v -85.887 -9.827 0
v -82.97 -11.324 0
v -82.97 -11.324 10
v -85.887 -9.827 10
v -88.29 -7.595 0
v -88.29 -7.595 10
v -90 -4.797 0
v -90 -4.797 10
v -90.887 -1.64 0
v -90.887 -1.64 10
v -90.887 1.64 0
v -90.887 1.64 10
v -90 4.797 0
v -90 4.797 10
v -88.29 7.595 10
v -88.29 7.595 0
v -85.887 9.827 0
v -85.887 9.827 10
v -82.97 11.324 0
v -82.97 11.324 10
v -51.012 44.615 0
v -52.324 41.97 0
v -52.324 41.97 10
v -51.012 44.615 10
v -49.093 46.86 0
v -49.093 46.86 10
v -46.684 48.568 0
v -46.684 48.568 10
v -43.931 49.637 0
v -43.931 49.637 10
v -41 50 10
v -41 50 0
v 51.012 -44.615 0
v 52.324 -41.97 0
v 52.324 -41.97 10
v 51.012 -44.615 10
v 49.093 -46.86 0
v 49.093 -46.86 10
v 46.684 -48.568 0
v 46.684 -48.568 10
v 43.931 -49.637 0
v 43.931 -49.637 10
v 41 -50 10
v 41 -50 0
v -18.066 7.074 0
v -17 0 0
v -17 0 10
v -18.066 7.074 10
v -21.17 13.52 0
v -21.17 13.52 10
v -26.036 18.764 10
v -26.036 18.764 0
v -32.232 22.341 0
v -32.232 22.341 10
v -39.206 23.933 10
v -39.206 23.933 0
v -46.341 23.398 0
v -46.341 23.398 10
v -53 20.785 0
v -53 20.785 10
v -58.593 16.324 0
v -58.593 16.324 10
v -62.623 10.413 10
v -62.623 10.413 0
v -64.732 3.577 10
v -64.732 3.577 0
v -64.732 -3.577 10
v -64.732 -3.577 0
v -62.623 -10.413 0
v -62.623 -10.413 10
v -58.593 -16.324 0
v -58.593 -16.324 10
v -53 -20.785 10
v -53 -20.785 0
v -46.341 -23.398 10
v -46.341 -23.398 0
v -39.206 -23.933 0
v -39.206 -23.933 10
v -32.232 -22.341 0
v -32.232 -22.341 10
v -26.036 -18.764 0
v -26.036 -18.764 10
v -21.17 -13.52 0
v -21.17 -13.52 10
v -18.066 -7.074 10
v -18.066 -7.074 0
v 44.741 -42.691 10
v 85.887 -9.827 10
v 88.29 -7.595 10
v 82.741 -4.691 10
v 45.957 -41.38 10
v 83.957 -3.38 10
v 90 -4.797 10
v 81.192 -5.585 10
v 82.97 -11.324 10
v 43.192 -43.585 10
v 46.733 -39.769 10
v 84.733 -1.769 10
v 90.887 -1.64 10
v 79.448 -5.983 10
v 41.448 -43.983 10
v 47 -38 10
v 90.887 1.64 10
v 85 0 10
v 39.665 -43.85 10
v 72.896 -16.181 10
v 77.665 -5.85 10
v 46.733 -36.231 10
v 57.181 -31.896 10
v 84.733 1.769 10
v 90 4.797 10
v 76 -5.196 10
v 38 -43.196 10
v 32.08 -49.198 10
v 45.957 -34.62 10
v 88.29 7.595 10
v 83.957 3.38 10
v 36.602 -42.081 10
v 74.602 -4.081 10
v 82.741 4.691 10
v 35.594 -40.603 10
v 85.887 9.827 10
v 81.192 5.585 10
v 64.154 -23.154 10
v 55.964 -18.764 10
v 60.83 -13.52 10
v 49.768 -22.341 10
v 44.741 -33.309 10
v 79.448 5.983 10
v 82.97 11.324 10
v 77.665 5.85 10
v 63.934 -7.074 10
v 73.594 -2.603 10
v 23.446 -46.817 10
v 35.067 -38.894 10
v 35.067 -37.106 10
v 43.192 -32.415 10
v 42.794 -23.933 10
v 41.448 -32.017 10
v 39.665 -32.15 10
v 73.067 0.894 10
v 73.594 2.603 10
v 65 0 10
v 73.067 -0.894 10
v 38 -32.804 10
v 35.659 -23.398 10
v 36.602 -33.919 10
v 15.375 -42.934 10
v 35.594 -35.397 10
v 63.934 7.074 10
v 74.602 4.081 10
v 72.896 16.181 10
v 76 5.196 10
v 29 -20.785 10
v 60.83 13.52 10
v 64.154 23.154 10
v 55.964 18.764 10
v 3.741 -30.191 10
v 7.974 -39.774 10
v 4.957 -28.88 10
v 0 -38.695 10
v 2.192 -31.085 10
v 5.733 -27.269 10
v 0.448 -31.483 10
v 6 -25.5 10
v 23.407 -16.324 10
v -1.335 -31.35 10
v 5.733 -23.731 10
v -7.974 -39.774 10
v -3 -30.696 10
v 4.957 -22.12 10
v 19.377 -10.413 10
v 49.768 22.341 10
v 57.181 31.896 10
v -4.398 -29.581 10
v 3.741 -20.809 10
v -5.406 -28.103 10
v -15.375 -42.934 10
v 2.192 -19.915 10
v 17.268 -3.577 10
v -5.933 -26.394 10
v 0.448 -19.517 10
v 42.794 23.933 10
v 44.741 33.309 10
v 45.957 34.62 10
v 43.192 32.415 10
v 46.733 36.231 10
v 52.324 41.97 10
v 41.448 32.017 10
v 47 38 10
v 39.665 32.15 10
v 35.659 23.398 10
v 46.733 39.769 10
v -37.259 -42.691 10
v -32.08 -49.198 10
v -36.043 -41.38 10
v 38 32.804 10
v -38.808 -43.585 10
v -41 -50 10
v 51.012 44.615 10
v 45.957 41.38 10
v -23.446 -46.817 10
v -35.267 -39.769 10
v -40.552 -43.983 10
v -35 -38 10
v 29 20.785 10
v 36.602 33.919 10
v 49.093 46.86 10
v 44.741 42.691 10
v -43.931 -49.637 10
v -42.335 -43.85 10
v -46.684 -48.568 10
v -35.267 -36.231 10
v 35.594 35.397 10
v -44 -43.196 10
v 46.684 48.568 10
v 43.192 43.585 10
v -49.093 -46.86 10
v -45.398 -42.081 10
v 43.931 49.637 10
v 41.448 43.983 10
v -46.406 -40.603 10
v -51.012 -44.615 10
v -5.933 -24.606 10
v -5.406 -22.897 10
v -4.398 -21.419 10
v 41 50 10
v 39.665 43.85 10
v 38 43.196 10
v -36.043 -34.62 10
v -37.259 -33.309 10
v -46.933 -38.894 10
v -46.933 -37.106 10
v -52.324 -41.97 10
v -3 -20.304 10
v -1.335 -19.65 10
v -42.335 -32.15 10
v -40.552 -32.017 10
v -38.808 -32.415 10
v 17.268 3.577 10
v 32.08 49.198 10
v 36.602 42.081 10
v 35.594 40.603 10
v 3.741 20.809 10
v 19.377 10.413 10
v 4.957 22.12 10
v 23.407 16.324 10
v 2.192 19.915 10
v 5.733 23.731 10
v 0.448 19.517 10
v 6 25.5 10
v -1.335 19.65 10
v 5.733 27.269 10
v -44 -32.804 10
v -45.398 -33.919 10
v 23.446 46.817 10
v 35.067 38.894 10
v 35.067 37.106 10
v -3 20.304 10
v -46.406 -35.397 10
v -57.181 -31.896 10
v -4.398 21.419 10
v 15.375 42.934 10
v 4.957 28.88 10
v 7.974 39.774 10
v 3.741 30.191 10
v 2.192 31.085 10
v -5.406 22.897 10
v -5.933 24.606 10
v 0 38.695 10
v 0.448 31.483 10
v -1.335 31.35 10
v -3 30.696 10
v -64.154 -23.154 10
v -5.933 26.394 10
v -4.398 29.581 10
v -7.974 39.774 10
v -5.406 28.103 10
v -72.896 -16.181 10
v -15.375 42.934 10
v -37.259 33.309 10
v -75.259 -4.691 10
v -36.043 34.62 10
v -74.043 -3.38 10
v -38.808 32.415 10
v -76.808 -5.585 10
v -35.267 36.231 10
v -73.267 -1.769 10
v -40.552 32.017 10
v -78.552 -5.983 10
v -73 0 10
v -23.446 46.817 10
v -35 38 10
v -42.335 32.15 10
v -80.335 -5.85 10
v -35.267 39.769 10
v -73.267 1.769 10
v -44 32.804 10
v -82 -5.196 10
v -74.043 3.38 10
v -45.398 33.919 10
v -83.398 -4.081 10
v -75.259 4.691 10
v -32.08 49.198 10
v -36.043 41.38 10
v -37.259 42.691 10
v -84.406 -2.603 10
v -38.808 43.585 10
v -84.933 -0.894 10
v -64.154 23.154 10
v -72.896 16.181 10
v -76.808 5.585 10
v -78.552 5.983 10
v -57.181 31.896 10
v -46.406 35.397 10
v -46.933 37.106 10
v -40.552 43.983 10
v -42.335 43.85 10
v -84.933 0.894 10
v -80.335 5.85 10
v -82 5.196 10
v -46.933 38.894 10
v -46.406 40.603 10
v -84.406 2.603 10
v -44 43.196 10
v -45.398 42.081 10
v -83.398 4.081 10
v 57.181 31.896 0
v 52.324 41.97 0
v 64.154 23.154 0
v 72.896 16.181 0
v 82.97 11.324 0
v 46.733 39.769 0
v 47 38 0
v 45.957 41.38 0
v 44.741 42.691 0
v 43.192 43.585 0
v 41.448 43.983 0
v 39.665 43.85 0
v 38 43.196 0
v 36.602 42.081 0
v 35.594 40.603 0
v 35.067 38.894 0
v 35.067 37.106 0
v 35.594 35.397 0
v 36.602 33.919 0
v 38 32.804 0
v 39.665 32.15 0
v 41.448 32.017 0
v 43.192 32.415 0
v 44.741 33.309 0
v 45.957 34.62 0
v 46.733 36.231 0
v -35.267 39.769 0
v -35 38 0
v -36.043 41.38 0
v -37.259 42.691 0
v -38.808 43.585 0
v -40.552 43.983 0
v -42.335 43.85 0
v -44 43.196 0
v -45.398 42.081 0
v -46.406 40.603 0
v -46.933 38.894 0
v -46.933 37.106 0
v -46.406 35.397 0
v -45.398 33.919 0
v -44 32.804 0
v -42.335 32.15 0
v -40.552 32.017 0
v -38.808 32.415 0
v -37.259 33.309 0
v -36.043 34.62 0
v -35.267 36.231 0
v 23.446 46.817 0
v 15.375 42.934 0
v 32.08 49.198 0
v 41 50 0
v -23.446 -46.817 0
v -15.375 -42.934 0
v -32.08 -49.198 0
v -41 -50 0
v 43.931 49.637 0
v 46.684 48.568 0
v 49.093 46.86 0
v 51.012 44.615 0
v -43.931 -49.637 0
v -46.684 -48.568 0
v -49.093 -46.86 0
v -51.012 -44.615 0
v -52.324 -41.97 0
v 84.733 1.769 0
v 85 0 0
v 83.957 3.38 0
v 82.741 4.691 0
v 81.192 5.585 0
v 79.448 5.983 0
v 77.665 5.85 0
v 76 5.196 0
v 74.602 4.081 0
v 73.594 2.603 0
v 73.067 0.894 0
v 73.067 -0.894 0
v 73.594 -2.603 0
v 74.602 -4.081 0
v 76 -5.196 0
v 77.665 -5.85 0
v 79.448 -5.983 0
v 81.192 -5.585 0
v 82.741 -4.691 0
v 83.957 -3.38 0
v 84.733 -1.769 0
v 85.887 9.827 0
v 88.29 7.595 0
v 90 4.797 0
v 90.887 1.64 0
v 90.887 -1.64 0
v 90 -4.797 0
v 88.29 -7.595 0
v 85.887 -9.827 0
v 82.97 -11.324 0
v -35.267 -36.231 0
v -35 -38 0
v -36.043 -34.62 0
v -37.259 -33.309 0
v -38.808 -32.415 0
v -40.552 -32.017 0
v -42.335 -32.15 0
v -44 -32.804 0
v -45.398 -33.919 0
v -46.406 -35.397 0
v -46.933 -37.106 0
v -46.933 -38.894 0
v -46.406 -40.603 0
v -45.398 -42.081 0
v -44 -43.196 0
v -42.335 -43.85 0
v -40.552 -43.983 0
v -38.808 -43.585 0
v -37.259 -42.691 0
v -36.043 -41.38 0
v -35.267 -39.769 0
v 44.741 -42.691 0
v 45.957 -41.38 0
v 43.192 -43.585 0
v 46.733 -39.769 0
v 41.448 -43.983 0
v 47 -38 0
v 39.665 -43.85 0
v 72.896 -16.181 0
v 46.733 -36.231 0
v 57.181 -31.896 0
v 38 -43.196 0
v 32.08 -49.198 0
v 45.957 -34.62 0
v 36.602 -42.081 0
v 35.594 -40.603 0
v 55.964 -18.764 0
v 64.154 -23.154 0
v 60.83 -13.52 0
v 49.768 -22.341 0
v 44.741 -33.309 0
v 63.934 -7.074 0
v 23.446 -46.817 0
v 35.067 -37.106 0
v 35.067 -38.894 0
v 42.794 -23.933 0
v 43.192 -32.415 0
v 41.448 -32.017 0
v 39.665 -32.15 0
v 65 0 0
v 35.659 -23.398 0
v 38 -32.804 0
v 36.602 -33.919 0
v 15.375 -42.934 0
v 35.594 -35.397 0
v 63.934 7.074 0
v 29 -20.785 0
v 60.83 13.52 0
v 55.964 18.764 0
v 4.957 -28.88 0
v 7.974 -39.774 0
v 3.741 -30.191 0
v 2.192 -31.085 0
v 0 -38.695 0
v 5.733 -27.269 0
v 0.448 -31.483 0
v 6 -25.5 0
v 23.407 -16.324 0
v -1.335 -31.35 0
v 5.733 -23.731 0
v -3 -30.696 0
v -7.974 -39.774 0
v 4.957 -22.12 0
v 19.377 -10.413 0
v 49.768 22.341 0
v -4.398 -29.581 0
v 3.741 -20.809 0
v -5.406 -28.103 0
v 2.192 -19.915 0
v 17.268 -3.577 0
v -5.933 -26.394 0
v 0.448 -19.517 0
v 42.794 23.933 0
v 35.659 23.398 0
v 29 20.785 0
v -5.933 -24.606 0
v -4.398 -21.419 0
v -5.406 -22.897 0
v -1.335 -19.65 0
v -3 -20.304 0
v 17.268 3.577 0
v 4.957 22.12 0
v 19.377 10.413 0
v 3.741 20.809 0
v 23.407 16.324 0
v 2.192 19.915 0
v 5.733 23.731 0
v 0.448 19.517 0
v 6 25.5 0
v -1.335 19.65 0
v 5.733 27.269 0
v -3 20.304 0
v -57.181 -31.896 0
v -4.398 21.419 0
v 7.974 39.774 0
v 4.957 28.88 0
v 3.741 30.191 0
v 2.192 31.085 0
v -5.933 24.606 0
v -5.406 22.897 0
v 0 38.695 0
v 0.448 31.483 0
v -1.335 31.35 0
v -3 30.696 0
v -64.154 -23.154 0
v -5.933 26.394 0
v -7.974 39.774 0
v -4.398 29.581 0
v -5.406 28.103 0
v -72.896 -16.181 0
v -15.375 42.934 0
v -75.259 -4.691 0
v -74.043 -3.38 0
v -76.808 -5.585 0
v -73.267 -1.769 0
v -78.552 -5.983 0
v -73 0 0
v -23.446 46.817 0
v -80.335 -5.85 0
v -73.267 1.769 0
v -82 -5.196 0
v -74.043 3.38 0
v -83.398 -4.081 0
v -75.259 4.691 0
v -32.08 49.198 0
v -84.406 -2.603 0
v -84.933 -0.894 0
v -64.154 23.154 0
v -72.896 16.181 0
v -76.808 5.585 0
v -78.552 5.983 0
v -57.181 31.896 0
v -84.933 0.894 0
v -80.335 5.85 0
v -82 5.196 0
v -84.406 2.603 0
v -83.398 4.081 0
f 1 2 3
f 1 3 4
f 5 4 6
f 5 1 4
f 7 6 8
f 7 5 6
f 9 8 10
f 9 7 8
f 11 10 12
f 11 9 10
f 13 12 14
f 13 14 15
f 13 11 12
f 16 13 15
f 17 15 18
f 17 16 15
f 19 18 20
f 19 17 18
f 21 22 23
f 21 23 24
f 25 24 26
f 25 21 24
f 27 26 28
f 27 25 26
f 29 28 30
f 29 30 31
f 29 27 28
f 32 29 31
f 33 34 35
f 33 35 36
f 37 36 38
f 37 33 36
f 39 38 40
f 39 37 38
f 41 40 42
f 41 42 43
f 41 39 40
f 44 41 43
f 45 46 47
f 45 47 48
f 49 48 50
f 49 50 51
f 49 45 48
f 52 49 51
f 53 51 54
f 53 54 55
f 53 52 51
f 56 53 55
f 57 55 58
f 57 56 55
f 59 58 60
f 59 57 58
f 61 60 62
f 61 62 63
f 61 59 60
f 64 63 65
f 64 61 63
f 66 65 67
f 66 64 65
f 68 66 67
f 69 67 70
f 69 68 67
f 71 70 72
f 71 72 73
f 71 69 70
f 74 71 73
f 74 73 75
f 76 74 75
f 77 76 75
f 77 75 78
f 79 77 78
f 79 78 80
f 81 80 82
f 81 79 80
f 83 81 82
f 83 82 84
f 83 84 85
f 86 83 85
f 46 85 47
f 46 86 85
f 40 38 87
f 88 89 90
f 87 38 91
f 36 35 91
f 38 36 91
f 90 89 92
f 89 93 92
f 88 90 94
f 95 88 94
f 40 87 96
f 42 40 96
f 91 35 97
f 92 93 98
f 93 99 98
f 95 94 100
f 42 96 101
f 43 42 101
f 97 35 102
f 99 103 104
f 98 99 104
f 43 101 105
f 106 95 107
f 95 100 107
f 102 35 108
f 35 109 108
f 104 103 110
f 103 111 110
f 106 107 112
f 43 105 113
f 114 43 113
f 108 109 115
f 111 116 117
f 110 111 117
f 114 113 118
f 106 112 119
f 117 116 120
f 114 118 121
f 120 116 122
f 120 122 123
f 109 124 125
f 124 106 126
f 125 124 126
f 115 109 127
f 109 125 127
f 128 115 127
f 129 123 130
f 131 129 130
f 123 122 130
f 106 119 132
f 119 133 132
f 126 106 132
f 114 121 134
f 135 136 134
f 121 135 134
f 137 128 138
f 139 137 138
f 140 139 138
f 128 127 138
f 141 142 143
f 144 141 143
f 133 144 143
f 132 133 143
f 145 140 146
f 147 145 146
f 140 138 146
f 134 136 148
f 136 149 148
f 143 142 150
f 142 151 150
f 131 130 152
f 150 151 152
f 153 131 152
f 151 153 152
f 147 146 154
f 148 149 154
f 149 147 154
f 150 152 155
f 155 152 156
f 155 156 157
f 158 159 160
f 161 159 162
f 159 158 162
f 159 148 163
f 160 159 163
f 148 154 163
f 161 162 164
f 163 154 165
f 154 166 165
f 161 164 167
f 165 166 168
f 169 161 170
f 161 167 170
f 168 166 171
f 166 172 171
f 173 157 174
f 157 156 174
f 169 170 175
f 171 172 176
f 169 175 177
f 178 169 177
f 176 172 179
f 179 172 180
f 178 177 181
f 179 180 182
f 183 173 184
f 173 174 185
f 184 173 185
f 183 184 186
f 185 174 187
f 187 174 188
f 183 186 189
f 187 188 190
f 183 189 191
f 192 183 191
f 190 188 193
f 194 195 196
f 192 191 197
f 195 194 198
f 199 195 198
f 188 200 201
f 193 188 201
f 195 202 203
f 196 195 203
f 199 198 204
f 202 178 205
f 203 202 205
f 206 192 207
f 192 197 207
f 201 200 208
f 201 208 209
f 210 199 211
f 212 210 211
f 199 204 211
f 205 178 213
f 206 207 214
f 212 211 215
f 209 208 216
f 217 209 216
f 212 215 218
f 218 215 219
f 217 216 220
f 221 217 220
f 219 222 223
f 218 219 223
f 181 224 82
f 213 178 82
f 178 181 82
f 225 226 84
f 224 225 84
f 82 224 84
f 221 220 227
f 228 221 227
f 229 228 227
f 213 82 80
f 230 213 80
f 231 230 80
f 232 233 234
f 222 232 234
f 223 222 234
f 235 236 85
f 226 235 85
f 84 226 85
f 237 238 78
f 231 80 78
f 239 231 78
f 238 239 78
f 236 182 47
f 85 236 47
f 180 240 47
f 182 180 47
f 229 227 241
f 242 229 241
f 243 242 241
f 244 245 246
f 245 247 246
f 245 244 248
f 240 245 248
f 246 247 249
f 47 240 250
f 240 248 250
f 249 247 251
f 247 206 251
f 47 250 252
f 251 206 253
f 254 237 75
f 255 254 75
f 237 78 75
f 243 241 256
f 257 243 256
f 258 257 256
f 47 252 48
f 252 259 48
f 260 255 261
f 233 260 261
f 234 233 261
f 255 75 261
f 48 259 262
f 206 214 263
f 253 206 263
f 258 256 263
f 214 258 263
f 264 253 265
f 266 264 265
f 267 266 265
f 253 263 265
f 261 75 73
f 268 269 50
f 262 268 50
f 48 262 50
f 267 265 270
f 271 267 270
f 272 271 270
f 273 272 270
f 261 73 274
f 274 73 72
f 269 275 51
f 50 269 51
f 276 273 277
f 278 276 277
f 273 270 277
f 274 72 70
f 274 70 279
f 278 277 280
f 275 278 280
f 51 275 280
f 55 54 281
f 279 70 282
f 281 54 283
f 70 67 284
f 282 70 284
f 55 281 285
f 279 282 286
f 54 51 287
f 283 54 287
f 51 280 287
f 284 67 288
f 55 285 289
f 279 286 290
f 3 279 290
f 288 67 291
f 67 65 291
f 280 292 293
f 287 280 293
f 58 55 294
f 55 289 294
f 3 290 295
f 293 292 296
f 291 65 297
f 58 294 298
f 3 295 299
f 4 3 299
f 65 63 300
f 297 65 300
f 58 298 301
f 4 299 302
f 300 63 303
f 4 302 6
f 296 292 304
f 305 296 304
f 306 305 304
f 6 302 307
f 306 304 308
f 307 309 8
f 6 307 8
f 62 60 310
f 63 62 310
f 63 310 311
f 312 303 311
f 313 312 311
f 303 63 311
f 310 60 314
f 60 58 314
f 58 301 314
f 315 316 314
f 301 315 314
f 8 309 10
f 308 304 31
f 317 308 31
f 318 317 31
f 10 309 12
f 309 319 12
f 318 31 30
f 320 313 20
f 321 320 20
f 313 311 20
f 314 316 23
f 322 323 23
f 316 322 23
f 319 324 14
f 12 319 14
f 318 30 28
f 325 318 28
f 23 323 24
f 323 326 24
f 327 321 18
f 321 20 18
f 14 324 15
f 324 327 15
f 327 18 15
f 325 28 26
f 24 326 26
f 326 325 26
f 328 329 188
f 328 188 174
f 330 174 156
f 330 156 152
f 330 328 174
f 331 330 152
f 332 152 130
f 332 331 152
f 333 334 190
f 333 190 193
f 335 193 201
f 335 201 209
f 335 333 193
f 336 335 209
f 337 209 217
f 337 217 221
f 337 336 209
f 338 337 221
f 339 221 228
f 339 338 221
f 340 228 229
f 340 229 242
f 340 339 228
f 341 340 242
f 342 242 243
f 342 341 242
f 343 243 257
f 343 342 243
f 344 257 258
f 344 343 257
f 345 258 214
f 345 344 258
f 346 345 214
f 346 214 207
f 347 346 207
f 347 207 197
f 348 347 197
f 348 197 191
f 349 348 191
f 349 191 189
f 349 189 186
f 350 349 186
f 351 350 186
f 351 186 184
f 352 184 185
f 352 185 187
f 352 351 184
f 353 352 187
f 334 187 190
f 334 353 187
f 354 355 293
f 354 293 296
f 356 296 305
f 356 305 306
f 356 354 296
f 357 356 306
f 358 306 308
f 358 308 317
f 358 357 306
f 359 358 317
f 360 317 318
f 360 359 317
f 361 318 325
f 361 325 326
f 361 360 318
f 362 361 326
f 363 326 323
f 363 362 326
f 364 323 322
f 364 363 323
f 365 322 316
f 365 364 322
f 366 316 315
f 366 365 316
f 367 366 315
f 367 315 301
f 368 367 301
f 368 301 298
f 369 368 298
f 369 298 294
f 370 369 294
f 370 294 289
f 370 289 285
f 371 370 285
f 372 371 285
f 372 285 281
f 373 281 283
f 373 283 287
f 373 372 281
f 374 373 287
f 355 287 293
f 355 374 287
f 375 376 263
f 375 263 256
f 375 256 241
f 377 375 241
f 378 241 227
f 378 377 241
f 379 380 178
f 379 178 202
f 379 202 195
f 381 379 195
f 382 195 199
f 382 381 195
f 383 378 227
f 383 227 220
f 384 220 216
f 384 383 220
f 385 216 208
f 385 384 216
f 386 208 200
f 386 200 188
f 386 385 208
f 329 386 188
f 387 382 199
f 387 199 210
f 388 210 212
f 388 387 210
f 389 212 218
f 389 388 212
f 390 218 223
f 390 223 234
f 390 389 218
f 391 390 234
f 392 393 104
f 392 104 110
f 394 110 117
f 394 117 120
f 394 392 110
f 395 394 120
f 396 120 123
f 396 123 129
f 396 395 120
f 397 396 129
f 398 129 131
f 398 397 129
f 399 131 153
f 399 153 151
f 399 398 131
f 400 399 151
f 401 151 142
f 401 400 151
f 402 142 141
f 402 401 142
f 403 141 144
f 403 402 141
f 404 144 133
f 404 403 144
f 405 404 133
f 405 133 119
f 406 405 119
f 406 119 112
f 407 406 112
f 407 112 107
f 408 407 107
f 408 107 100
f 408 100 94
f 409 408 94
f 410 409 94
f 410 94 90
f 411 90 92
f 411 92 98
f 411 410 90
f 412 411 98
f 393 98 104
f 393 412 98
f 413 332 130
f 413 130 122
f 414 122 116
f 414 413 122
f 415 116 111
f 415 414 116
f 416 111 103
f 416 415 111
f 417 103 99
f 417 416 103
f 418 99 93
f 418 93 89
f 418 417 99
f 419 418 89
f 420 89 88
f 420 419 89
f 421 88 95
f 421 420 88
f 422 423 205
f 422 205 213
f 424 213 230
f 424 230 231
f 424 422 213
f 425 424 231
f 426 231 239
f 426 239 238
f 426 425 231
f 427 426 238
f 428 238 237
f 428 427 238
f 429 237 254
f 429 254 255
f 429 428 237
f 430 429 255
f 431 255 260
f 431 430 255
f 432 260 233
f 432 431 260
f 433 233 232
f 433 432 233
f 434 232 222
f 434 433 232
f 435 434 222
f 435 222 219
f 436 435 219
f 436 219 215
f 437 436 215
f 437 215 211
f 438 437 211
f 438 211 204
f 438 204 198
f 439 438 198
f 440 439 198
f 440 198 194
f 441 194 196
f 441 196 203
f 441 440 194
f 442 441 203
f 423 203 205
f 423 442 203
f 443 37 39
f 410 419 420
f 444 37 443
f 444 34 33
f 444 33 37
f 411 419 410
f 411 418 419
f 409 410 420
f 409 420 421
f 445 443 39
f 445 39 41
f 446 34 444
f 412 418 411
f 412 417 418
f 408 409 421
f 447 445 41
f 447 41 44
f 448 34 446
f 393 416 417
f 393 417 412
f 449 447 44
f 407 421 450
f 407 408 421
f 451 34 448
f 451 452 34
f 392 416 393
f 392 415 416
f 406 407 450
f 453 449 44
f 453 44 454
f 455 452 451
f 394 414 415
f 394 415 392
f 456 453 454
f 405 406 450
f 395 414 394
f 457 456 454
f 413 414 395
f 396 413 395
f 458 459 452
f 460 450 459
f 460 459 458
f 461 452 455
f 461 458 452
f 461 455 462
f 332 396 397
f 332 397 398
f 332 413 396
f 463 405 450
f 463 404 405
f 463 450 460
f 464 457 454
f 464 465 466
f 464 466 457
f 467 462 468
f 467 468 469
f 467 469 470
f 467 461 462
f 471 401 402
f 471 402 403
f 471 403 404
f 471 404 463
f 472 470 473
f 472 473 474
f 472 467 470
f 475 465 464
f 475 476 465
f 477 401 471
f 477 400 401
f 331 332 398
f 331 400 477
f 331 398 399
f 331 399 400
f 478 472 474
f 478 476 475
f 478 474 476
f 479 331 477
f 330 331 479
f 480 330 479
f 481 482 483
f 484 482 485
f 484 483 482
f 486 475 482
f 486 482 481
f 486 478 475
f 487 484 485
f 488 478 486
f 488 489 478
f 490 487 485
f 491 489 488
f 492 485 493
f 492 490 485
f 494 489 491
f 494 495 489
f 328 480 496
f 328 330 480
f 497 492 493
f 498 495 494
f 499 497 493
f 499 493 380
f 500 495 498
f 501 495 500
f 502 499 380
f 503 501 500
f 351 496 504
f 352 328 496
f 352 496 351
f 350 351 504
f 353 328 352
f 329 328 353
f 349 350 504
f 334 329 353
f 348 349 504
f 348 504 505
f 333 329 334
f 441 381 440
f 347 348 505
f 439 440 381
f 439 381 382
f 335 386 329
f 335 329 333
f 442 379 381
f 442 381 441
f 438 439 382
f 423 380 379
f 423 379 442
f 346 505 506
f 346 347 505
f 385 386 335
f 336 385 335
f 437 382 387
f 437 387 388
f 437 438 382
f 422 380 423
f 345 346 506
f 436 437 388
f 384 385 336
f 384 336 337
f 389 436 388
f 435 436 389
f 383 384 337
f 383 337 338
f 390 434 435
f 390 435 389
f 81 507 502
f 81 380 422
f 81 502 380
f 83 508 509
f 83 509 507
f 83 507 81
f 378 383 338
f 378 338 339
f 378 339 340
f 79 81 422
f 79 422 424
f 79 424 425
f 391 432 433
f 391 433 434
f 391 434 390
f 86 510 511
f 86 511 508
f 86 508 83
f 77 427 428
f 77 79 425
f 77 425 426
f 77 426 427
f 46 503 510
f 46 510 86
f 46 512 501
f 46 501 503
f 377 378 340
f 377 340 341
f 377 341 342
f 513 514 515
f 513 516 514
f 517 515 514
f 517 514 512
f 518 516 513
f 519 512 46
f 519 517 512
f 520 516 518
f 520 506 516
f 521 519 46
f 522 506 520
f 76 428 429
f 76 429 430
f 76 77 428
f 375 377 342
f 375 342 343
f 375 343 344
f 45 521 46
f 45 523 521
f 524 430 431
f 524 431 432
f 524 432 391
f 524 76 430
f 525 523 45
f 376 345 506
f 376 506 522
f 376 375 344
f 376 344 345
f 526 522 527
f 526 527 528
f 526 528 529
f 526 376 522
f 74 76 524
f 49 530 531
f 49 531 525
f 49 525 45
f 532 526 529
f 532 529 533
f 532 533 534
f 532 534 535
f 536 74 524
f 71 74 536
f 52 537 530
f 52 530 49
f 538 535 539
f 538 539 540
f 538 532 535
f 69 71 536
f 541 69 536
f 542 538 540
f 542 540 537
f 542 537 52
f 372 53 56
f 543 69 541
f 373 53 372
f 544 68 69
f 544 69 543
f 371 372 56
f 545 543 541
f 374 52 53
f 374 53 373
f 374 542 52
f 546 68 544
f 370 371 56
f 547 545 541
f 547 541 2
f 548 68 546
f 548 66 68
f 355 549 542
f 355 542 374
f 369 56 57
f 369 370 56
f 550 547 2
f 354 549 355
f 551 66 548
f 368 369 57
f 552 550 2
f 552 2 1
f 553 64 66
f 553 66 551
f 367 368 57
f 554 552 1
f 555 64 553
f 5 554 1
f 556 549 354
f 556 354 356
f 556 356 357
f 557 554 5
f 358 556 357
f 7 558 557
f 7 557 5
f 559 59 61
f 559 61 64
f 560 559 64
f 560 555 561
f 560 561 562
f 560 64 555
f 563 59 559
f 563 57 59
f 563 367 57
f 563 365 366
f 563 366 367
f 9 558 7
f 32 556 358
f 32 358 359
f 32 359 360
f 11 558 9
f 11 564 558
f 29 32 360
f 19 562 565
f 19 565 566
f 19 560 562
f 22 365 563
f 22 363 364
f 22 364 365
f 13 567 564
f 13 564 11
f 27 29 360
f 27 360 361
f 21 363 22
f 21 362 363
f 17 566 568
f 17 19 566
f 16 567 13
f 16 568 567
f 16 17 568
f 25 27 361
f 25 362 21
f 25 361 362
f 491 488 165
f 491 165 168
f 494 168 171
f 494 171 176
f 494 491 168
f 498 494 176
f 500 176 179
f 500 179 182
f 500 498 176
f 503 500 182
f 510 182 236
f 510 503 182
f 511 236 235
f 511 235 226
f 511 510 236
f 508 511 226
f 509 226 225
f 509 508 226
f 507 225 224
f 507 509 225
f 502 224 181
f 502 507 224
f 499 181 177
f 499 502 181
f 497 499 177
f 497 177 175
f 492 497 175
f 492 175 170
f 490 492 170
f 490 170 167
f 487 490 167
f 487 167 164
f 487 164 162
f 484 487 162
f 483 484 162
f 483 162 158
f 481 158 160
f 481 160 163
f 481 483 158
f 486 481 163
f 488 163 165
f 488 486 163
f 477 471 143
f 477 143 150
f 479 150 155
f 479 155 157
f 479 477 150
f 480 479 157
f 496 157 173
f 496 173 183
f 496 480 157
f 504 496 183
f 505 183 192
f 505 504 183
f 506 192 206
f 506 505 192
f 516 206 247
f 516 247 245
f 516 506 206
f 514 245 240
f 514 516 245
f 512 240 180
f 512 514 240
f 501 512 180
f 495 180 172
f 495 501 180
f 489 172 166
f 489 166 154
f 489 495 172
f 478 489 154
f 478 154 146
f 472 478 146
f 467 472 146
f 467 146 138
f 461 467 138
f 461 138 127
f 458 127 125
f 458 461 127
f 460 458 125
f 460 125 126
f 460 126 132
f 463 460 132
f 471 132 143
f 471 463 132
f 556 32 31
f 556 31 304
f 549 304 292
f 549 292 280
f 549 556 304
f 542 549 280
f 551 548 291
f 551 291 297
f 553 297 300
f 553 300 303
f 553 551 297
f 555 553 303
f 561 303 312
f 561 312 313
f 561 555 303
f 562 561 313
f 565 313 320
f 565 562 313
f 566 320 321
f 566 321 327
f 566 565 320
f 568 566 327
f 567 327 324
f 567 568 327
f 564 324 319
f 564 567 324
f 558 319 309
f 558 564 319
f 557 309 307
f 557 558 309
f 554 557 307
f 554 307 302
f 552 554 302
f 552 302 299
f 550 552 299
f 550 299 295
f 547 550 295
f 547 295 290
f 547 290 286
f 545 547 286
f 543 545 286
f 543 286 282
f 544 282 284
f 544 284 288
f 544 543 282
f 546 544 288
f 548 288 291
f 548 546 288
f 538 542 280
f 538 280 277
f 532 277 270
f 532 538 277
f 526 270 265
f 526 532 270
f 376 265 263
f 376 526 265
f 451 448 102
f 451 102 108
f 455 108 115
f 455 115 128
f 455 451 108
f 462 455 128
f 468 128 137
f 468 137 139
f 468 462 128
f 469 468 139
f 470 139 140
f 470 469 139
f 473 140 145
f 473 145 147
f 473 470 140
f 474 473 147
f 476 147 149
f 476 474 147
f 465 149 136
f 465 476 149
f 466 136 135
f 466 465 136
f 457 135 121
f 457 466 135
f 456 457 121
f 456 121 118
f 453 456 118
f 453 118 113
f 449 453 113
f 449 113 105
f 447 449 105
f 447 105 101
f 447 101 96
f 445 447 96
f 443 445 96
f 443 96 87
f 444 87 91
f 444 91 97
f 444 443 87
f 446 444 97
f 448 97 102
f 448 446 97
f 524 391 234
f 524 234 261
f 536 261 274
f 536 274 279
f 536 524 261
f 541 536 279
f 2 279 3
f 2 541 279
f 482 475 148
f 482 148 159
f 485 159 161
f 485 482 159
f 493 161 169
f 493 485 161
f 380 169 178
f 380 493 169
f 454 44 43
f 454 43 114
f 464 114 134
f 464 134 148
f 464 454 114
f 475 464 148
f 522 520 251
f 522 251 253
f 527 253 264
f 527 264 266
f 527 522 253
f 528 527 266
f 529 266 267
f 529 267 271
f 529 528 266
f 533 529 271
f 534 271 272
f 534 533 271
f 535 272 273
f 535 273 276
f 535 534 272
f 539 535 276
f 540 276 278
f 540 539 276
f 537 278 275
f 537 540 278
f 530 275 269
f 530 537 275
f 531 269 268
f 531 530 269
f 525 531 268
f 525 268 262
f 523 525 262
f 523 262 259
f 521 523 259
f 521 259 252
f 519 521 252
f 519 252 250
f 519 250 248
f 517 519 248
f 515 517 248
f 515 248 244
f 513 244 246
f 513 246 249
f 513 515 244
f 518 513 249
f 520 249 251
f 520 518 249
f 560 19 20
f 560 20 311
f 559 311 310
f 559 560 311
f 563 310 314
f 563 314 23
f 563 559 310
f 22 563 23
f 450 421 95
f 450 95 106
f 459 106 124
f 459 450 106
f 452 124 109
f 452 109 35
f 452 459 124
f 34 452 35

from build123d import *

# Parameters (mm, degrees)
SKETCH_1_R      = 6
SKETCH_1_R_2    = 24
EXTRUDE_1_DEPTH = 10


with BuildPart() as part:
    # Эскиз1 → Бобышка-Вытянуть1 (new body)
    with BuildSketch(Plane.XY):
        with BuildLine():
            ThreePointArc((-41, 50), (-27.709365364, 48.201234745), (-15.375, 42.934361239))
            ThreePointArc((-15.375, 42.934361239), (0, 38.694977982), (15.375, 42.934361239))
            ThreePointArc((15.375, 42.934361239), (27.709365364, 48.201234745), (41, 50))
            ThreePointArc((41, 50), (47.941363325, 47.78864011), (52.324417909, 41.969579199))
            ThreePointArc((52.324417909, 41.969579199), (64.154153471, 23.154153471), (82.969579199, 11.324417909))
            ThreePointArc((82.969579199, 11.324417909), (91, 0), (82.969579199, -11.324417909))
            ThreePointArc((82.969579199, -11.324417909), (64.154153471, -23.154153471), (52.324417909, -41.969579199))
            ThreePointArc((52.324417909, -41.969579199), (47.941363325, -47.78864011), (41, -50))
            ThreePointArc((41, -50), (27.709365364, -48.201234745), (15.375, -42.934361239))
            ThreePointArc((15.375, -42.934361239), (0, -38.694977982), (-15.375, -42.934361239))
            ThreePointArc((-15.375, -42.934361239), (-27.709365364, -48.201234745), (-41, -50))
            ThreePointArc((-41, -50), (-47.941363325, -47.78864011), (-52.324417909, -41.969579199))
            ThreePointArc((-52.324417909, -41.969579199), (-64.154153471, -23.154153471), (-82.969579199, -11.324417909))
            ThreePointArc((-82.969579199, -11.324417909), (-91, 0), (-82.969579199, 11.324417909))
            ThreePointArc((-82.969579199, 11.324417909), (-64.154153471, 23.154153471), (-52.324417909, 41.969579199))
            ThreePointArc((-52.324417909, 41.969579199), (-47.941363325, 47.78864011), (-41, 50))
        make_face()
        with Locations((-79, 0)):
            Circle(SKETCH_1_R, mode=Mode.SUBTRACT)
        with Locations((-41, 0)):
            Circle(SKETCH_1_R_2, mode=Mode.SUBTRACT)
        with Locations((41, 0)):
            Circle(SKETCH_1_R_2, mode=Mode.SUBTRACT)
        with Locations((79, 0)):
            Circle(SKETCH_1_R, mode=Mode.SUBTRACT)
        with Locations((41, -38)):
            Circle(SKETCH_1_R, mode=Mode.SUBTRACT)
        with Locations((41, 38)):
            Circle(SKETCH_1_R, mode=Mode.SUBTRACT)
        with Locations((0, 25.5)):
            Circle(SKETCH_1_R, mode=Mode.SUBTRACT)
        with Locations((0, -25.5)):
            Circle(SKETCH_1_R, mode=Mode.SUBTRACT)
        with Locations((-41, -38)):
            Circle(SKETCH_1_R, mode=Mode.SUBTRACT)
        with Locations((-41, 38)):
            Circle(SKETCH_1_R, mode=Mode.SUBTRACT)
    extrude(amount=EXTRUDE_1_DEPTH)


solid = part.part
